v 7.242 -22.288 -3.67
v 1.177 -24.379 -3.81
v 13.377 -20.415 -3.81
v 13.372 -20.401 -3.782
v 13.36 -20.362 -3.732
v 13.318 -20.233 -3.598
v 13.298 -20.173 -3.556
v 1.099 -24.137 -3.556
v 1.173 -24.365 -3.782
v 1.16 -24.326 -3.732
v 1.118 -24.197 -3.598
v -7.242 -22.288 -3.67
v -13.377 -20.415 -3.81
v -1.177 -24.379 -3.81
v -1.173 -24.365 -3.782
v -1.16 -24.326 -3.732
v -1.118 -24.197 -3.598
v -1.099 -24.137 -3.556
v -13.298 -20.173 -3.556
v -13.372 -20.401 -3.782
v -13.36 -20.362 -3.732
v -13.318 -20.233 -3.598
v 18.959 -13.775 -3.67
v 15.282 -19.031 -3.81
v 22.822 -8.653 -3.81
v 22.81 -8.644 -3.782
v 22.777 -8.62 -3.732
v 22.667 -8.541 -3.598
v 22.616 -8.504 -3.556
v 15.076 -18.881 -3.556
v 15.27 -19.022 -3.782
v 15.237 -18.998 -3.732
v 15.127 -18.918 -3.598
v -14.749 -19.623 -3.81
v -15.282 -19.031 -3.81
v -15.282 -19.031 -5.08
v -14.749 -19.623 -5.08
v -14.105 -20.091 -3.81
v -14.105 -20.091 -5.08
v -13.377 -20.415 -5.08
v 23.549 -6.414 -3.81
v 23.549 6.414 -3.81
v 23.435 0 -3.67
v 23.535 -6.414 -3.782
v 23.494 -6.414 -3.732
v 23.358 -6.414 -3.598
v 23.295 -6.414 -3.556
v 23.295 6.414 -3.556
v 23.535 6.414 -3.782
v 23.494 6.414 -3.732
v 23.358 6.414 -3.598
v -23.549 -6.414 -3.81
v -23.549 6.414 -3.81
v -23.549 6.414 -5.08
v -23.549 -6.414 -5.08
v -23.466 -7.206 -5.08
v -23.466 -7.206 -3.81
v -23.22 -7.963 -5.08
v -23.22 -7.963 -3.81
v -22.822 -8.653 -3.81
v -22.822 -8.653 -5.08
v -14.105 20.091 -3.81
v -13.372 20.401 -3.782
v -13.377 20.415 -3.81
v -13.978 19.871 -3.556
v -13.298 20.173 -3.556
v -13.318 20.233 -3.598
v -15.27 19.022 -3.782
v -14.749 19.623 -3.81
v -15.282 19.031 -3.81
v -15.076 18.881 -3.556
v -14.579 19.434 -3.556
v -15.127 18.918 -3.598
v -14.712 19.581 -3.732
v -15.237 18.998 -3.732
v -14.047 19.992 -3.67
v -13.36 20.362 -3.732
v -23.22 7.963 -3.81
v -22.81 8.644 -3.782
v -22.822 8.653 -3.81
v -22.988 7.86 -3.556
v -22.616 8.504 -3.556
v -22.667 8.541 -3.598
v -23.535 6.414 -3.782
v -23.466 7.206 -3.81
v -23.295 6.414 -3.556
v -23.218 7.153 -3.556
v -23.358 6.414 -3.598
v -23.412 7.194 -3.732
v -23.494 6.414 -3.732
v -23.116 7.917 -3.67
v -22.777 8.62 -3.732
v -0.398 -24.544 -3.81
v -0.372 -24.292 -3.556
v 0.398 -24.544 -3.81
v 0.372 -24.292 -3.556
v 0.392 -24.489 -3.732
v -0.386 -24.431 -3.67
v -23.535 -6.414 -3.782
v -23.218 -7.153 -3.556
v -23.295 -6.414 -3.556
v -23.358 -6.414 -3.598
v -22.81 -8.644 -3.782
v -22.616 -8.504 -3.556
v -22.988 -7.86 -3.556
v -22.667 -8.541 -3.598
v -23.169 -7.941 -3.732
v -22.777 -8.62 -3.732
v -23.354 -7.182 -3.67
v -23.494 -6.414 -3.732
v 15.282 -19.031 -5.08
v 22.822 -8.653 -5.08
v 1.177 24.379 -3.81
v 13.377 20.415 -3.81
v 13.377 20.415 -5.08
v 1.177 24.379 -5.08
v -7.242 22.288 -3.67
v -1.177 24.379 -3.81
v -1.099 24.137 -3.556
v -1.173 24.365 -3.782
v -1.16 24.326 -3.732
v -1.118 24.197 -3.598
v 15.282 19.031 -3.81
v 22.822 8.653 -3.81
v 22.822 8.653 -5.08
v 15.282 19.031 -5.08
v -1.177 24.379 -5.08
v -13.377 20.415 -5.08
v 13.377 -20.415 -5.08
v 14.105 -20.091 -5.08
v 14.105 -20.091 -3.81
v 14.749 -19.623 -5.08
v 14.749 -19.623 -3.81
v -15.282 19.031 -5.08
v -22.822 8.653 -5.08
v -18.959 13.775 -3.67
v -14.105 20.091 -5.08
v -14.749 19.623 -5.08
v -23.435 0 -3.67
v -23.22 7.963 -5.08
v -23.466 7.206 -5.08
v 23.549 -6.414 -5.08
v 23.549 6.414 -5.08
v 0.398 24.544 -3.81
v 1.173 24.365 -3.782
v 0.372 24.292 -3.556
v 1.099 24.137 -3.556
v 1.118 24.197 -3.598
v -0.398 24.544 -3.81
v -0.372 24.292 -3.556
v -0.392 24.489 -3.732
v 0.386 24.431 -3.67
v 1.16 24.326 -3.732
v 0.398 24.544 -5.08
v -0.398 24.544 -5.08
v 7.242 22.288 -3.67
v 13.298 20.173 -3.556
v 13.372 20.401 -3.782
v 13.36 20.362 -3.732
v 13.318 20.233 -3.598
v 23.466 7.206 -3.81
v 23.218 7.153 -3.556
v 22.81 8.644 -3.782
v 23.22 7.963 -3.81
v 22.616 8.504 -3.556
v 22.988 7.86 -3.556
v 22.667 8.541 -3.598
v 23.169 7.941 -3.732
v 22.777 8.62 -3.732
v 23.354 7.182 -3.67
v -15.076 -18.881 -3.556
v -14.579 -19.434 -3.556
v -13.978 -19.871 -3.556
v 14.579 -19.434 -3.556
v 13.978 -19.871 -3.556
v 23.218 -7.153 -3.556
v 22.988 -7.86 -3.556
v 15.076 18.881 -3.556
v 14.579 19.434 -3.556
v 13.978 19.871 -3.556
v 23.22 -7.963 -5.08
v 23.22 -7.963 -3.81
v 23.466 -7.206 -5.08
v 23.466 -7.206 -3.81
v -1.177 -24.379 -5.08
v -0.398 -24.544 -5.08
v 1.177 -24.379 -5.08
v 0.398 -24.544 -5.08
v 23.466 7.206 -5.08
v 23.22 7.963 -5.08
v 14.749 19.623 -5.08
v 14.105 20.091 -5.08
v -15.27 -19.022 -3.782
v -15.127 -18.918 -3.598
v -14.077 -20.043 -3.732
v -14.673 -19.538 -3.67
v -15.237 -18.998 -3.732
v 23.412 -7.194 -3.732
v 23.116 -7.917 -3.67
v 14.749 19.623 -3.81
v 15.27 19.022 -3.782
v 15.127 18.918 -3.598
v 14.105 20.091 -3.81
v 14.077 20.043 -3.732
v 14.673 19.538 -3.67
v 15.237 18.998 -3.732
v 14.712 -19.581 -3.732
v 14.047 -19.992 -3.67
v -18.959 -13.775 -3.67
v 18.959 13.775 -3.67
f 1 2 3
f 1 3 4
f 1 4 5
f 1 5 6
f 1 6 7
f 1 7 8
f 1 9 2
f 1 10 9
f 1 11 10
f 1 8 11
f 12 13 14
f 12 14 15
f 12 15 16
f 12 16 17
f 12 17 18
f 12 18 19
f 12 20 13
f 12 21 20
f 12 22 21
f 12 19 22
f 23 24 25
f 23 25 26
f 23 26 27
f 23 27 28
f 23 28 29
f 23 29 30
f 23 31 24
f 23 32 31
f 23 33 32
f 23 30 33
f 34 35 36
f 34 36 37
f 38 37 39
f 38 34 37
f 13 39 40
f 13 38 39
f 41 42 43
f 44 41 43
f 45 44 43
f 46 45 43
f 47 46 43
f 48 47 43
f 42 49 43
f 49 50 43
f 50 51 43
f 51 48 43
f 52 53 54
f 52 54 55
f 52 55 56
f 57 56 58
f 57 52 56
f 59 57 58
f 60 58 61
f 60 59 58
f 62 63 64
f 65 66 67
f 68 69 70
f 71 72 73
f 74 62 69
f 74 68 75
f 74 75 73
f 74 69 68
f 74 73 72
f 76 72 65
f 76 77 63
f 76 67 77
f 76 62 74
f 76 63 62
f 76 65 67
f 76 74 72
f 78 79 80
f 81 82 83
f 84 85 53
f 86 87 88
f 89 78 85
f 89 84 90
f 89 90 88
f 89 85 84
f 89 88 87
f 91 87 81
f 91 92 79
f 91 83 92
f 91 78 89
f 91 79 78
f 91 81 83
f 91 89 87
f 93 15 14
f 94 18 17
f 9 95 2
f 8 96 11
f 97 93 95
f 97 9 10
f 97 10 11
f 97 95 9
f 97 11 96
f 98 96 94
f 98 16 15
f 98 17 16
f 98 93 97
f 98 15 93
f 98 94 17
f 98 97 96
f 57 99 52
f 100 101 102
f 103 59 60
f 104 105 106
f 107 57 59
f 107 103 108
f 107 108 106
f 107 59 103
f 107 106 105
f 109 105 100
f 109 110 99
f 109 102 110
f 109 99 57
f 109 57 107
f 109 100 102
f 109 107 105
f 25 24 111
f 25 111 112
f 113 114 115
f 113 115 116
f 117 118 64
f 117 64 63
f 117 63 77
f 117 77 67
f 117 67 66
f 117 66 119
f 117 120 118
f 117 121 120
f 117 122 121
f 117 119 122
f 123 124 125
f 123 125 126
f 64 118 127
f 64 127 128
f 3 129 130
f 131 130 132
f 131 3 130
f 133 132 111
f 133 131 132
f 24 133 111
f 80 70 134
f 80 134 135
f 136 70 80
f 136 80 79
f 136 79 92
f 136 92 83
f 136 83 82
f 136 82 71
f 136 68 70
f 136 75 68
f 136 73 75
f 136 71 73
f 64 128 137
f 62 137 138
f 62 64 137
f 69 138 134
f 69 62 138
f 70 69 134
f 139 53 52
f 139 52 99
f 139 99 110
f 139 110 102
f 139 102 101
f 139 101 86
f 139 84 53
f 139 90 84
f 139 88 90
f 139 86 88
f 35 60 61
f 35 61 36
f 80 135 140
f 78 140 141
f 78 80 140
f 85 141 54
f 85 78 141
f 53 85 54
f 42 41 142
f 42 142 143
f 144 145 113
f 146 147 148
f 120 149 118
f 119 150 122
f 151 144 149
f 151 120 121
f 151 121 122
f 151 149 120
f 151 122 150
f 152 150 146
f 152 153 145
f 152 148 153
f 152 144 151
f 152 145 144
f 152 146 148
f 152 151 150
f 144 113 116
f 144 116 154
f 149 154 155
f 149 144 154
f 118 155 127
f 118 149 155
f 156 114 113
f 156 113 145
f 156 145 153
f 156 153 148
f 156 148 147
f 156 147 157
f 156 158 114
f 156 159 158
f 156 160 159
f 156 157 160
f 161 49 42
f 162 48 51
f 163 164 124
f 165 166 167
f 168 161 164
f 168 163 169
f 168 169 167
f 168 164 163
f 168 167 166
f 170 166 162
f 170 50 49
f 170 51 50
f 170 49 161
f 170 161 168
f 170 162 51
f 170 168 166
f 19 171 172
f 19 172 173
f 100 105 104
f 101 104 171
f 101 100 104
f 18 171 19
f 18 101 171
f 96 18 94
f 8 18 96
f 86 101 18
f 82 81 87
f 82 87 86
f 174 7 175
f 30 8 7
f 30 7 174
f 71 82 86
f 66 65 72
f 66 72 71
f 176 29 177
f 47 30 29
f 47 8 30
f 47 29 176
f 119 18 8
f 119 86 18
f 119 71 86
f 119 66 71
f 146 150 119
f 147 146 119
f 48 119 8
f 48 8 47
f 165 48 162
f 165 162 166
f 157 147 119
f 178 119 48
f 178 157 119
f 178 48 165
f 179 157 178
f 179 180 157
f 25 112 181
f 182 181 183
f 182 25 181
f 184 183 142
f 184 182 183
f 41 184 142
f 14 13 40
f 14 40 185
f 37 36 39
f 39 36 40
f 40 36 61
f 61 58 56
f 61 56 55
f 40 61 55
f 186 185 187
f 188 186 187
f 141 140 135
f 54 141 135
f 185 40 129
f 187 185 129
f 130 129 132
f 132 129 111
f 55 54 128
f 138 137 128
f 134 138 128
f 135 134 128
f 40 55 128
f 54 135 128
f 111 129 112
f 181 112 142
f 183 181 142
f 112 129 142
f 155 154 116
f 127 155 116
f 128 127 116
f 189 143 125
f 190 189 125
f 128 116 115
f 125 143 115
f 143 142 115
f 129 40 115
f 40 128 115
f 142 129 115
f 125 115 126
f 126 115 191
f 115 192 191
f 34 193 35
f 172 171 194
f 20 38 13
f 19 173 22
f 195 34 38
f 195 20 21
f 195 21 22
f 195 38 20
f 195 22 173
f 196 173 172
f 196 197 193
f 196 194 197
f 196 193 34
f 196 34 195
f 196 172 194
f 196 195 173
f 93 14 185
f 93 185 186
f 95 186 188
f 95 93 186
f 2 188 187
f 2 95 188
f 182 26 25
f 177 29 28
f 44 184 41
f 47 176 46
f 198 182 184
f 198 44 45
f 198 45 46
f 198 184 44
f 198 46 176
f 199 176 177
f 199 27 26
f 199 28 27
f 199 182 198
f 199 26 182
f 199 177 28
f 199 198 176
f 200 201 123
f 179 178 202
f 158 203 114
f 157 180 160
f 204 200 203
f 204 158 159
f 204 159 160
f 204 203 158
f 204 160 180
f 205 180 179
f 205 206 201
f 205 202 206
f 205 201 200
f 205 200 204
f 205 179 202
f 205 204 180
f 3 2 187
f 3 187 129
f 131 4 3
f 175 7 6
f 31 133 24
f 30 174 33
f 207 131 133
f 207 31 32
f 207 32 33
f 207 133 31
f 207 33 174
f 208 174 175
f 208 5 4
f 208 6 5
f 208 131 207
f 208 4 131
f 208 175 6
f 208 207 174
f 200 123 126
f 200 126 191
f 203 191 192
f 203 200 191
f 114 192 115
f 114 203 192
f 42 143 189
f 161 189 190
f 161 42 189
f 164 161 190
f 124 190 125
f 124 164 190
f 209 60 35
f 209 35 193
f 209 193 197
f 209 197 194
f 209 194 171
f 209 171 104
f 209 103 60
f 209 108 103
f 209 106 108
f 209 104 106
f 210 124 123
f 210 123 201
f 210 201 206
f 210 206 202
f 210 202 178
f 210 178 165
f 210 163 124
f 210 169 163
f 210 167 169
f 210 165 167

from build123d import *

# Parameters (mm, degrees)
F1_DEPTH       = 5.08
F2_R           = 6.35
F3_R           = 1.27
F5_DEPTH       = 1.27
F7_D           = 3.81
F7_DEPTH       = 12.7
F7_CBORE_D     = 5.08
F7_CBORE_DEPTH = 1.27
F7_TIP         = 1.1446394792
F8_DEPTH       = 25.4
F9_DEPTH       = 6.35
F10_DEPTH      = 1.016
F11_T1_DEPTH   = 12.8274282372
F11_T3_DEPTH   = 12.8274282372
F11_T5_DEPTH   = 12.8274282372
F11_T7_DEPTH   = 12.8274282372
F11_T9_DEPTH   = 12.8274282372
F11_T11_DEPTH  = 12.8274282372
F11_T13_DEPTH  = 12.8274282372
F11_T15_DEPTH  = 12.8274282372
F11_T17_DEPTH  = 12.8274282372
F11_T20_ANGLE  = 36
F11_T22_ANGLE  = 36
F11_T24_ANGLE  = 36
F11_T26_ANGLE  = 36
F11_T28_ANGLE  = 36
F11_T30_ANGLE  = 36
F11_T32_ANGLE  = 36
F11_T34_ANGLE  = 36
F11_T36_ANGLE  = 36
F11_T38_ANGLE  = 36


# Not quite as in the source:
# - a fillet or chamfer that OpenCascade refuses, or shapes differently, is made with other operations: its cross-section is extruded or revolved along the edge and cut away or added


with BuildPart() as f1:
    # F0 (on Top) → F1 (new body, symmetric)
    with BuildSketch(Plane.XY):
        Polygon((26.089382355, -8.4769541897), (26.089382355, 8.4769541897), (16.1241250409, 22.1929541897), (0, 27.432), (-16.1241250409, 22.1929541897), (-26.089382355, 8.4769541897), (-26.089382355, -8.4769541897), (-16.1241250409, -22.1929541897), (0, -27.432), (16.1241250409, -22.1929541897), align=None)
    extrude(amount=F1_DEPTH, both=True)

    # F2
    f2_edges = [f1.edges().sort_by_distance(p)[0] for p in [
        (-16.124125, -22.192954, 0),
        (-26.089382, -8.476954, 0),
        (-26.089382, 8.476954, 0),
        (-16.124125, 22.192954, 0),
        (0, 27.432, 0),
        (16.124125, 22.192954, 0),
        (26.089382, 8.476954, 0),
        (16.124125, -22.192954, 0),
        (0, -27.432, 0),
        (26.089382, -8.476954, 0),
    ]]
    fillet(f2_edges, radius=F2_R)

    # F3
    f3_edges = [f1.edges().sort_by_distance(p)[0] for p in [
        (21.106754, -15.334954, -5.08),
        (15.932046, -21.928579, -5.08),
        (25.778591, -8.375972, -5.08),
        (8.062063, -24.812477, -5.08),
        (26.089382, 0, -5.08),
        (0, -27.105215, -5.08),
        (25.778591, 8.375972, -5.08),
        (-8.062063, -24.812477, -5.08),
        (21.106754, 15.334954, -5.08),
        (-15.932046, -21.928579, -5.08),
        (15.932046, 21.928579, -5.08),
        (-21.106754, -15.334954, -5.08),
        (8.062063, 24.812477, -5.08),
        (-25.778591, -8.375972, -5.08),
        (0, 27.105215, -5.08),
        (-26.089382, 0, -5.08),
        (-8.062063, 24.812477, -5.08),
        (-25.778591, 8.375972, -5.08),
        (-15.932046, 21.928579, -5.08),
        (-21.106754, 15.334954, -5.08),
    ]]
    fillet(f3_edges, radius=F3_R)

    # F4 (on face) → F5 (cut)
    with BuildSketch(Plane.XY.offset(5.08)):
        with BuildLine():
            ThreePointArc((-23.549382355, -6.4137141186), (-23.3629076821, -7.5910688672), (-22.8217371036, -8.6531759298))
            Line((-22.8217371036, -8.6531759298), (-15.2819639609, -19.0307833679))
            ThreePointArc((-15.2819639609, -19.0307833679), (-14.4390710236, -19.8736763052), (-13.3769639609, -20.4148468837))
            Line((-13.3769639609, -20.4148468837), (-1.1773547486, -24.3787402032))
            ThreePointArc((-1.1773547486, -24.3787402032), (0, -24.5652148761), (1.1773547486, -24.3787402032))
            Line((1.1773547486, -24.3787402032), (13.3769639609, -20.4148468837))
            ThreePointArc((13.3769639609, -20.4148468837), (14.4390710236, -19.8736763052), (15.2819639609, -19.0307833679))
            Line((15.2819639609, -19.0307833679), (22.8217371036, -8.6531759298))
            ThreePointArc((22.8217371036, -8.6531759298), (23.3629076821, -7.5910688672), (23.549382355, -6.4137141186))
            Line((23.549382355, -6.4137141186), (23.549382355, 6.4137141186))
            ThreePointArc((23.549382355, 6.4137141186), (23.3629076821, 7.5910688672), (22.8217371036, 8.6531759298))
            Line((22.8217371036, 8.6531759298), (15.2819639609, 19.0307833679))
            ThreePointArc((15.2819639609, 19.0307833679), (14.4390710236, 19.8736763052), (13.3769639609, 20.4148468837))
            Line((13.3769639609, 20.4148468837), (1.1773547486, 24.3787402032))
            ThreePointArc((1.1773547486, 24.3787402032), (0, 24.5652148761), (-1.1773547486, 24.3787402032))
            Line((-1.1773547486, 24.3787402032), (-13.3769639609, 20.4148468837))
            ThreePointArc((-13.3769639609, 20.4148468837), (-14.4390710236, 19.8736763052), (-15.2819639609, 19.0307833679))
            Line((-15.2819639609, 19.0307833679), (-22.8217371036, 8.6531759298))
            ThreePointArc((-22.8217371036, 8.6531759298), (-23.3629076821, 7.5910688672), (-23.549382355, 6.4137141186))
            Line((-23.549382355, 6.4137141186), (-23.549382355, -6.4137141186))
        make_face()
    extrude(amount=-F5_DEPTH, mode=Mode.SUBTRACT)

    # F7
    with Locations(Plane.YZ.offset(26.089382355)):
        with Locations((0, 0)):
            CounterBoreHole(F7_D / 2, F7_CBORE_D / 2, F7_CBORE_DEPTH, depth=F7_DEPTH)
            with Locations((0, 0, -(F7_DEPTH + F7_TIP / 2))):  # 118° drill point
                Cone(0, F7_D / 2, F7_TIP, mode=Mode.SUBTRACT)

    # F8 (cut): a face of the model
    f8_faces = [f1.faces().sort_by_distance(p)[0] for p in [
        (20.4980312163, -14.892691419, 5.08),
    ]]
    extrude(f8_faces, amount=-F8_DEPTH, mode=Mode.SUBTRACT)

    # F9 (cut): a face of the model
    f9_faces = [f1.faces().sort_by_distance(p)[0] for p in [
        (0, 0, 3.81),
    ]]
    extrude(f9_faces, amount=-F9_DEPTH, mode=Mode.SUBTRACT)

    # F10 (cut): a face of the model
    f10_faces = [f1.faces().sort_by_distance(p)[0] for p in [
        (0, 0, -2.54),
    ]]
    extrude(f10_faces, amount=-F10_DEPTH, mode=Mode.SUBTRACT)

    # F11: fillet of radius 0.254 on 20 edges, made by hand

    # F11_s2 → F11_t1 (cut)
    with BuildSketch(Plane(origin=(3.7698865713, 5.188803719, 0), x_dir=(0, 0, 1), z_dir=(-0.5877852523, -0.8090169944, 0))):
        with BuildLine():
            add(Edge.make_bspline(
                [(-3.81, 23.549382355), (-3.556, 23.549382355), (-3.556, 23.295382355)],
                knots=[0, 0, 0, 1, 1, 1], degree=2, weights=[1, 0.1111111111, 1]))
            Line((-3.556, 23.295382355), (-3.556, 23.549382355))
            Line((-3.556, 23.549382355), (-3.81, 23.549382355))
        make_face()
    extrude(amount=F11_T1_DEPTH, mode=Mode.SUBTRACT)

    # F11_s4 → F11_t3 (cut)
    with BuildSketch(Plane.XZ.offset(-6.4137141186)):
        with BuildLine():
            add(Edge.make_bspline(
                [(-23.549382355, -3.81), (-23.549382355, -3.556), (-23.295382355, -3.556)],
                knots=[0, 0, 0, 1, 1, 1], degree=2, weights=[1, 0.1111111111, 1]))
            Line((-23.295382355, -3.556), (-23.549382355, -3.556))
            Line((-23.549382355, -3.556), (-23.549382355, -3.81))
        make_face()
        with BuildLine():
            add(Edge.make_bspline(
                [(23.549382355, -3.81), (23.549382355, -3.556), (23.295382355, -3.556)],
                knots=[0, 0, 0, 1, 1, 1], degree=2, weights=[1, 0.1111111111, 1]))
            Line((23.295382355, -3.556), (23.549382355, -3.556))
            Line((23.549382355, -3.556), (23.549382355, -3.81))
        make_face()
    extrude(amount=F11_T3_DEPTH, mode=Mode.SUBTRACT)

    # F11_s6 → F11_t5 (cut)
    with BuildSketch(Plane(origin=(-3.7698865713, 5.188803719, 0), x_dir=(0, 0, 1), z_dir=(0.5877852523, -0.8090169944, 0))):
        with BuildLine():
            add(Edge.make_bspline(
                [(-3.81, 23.549382355), (-3.556, 23.549382355), (-3.556, 23.295382355)],
                knots=[0, 0, 0, 1, 1, 1], degree=2, weights=[1, 0.1111111111, 1]))
            Line((-3.556, 23.295382355), (-3.556, 23.549382355))
            Line((-3.556, 23.549382355), (-3.81, 23.549382355))
        make_face()
    extrude(amount=F11_T5_DEPTH, mode=Mode.SUBTRACT)

    # F11_s8 → F11_t7 (cut)
    with BuildSketch(Plane(origin=(-6.0998046062, 1.9819466597, 0), x_dir=(0, 0, 1), z_dir=(0.9510565163, -0.3090169944, 0))):
        with BuildLine():
            add(Edge.make_bspline(
                [(-3.81, 23.549382355), (-3.556, 23.549382355), (-3.556, 23.295382355)],
                knots=[0, 0, 0, 1, 1, 1], degree=2, weights=[1, 0.1111111111, 1]))
            Line((-3.556, 23.295382355), (-3.556, 23.549382355))
            Line((-3.556, 23.549382355), (-3.81, 23.549382355))
        make_face()
    extrude(amount=F11_T7_DEPTH, mode=Mode.SUBTRACT)

    # F11_s10 → F11_t9 (cut)
    with BuildSketch(Plane(origin=(-6.0998046062, -1.9819466597, 0), x_dir=(0, 0, 1), z_dir=(0.9510565163, 0.3090169944, 0))):
        with BuildLine():
            add(Edge.make_bspline(
                [(-3.81, 23.549382355), (-3.556, 23.549382355), (-3.556, 23.295382355)],
                knots=[0, 0, 0, 1, 1, 1], degree=2, weights=[1, 0.1111111111, 1]))
            Line((-3.556, 23.295382355), (-3.556, 23.549382355))
            Line((-3.556, 23.549382355), (-3.81, 23.549382355))
        make_face()
    extrude(amount=F11_T9_DEPTH, mode=Mode.SUBTRACT)

    # F11_s12 → F11_t11 (cut)
    with BuildSketch(Plane(origin=(-3.7698865713, -5.188803719, 0), x_dir=(0, 0, 1), z_dir=(0.5877852523, 0.8090169944, 0))):
        with BuildLine():
            add(Edge.make_bspline(
                [(-3.81, 23.549382355), (-3.556, 23.549382355), (-3.556, 23.295382355)],
                knots=[0, 0, 0, 1, 1, 1], degree=2, weights=[1, 0.1111111111, 1]))
            Line((-3.556, 23.295382355), (-3.556, 23.549382355))
            Line((-3.556, 23.549382355), (-3.81, 23.549382355))
        make_face()
    extrude(amount=F11_T11_DEPTH, mode=Mode.SUBTRACT)

    # F11_s14 → F11_t13 (cut)
    with BuildSketch(Plane(origin=(3.7698865713, -5.188803719, 0), x_dir=(0, 0, 1), z_dir=(-0.5877852523, 0.8090169944, 0))):
        with BuildLine():
            add(Edge.make_bspline(
                [(-3.81, 23.549382355), (-3.556, 23.549382355), (-3.556, 23.295382355)],
                knots=[0, 0, 0, 1, 1, 1], degree=2, weights=[1, 0.1111111111, 1]))
            Line((-3.556, 23.295382355), (-3.556, 23.549382355))
            Line((-3.556, 23.549382355), (-3.81, 23.549382355))
        make_face()
    extrude(amount=F11_T13_DEPTH, mode=Mode.SUBTRACT)

    # F11_s16 → F11_t15 (cut)
    with BuildSketch(Plane(origin=(6.0998046062, -1.9819466597, 0), x_dir=(0, 0, 1), z_dir=(-0.9510565163, 0.3090169944, 0))):
        with BuildLine():
            add(Edge.make_bspline(
                [(-3.81, 23.549382355), (-3.556, 23.549382355), (-3.556, 23.295382355)],
                knots=[0, 0, 0, 1, 1, 1], degree=2, weights=[1, 0.1111111111, 1]))
            Line((-3.556, 23.295382355), (-3.556, 23.549382355))
            Line((-3.556, 23.549382355), (-3.81, 23.549382355))
        make_face()
    extrude(amount=F11_T15_DEPTH, mode=Mode.SUBTRACT)

    # F11_s18 → F11_t17 (cut)
    with BuildSketch(Plane(origin=(6.0998046062, 1.9819466597, 0), x_dir=(0, 0, 1), z_dir=(-0.9510565163, -0.3090169944, 0))):
        with BuildLine():
            add(Edge.make_bspline(
                [(-3.81, 23.549382355), (-3.556, 23.549382355), (-3.556, 23.295382355)],
                knots=[0, 0, 0, 1, 1, 1], degree=2, weights=[1, 0.1111111111, 1]))
            Line((-3.556, 23.295382355), (-3.556, 23.549382355))
            Line((-3.556, 23.549382355), (-3.81, 23.549382355))
        make_face()
    extrude(amount=F11_T17_DEPTH, mode=Mode.SUBTRACT)

    # F11_s19 → F11_t20 (revolve, cut)
    with BuildSketch(Plane(origin=(-6.0998046062, -1.9819466597, 0), x_dir=(0, 0, 1), z_dir=(0.9510565163, 0.3090169944, 0))):
        with BuildLine():
            add(Edge.make_bspline(
                [(-3.81, -23.549382355), (-3.556, -23.549382355), (-3.556, -23.295382355)],
                knots=[0, 0, 0, 1, 1, 1], degree=2, weights=[1, 0.1111111111, 1]))
            Line((-3.556, -23.295382355), (-3.556, -23.549382355))
            Line((-3.556, -23.549382355), (-3.81, -23.549382355))
        make_face()
    revolve(axis=Axis((-12.1996092123, 16.7913215567, -3.556), (0, 0, 1)), revolution_arc=F11_T20_ANGLE, mode=Mode.SUBTRACT)

    # F11_s21 → F11_t22 (revolve, cut)
    with BuildSketch(Plane(origin=(-3.7698865713, -5.188803719, 0), x_dir=(0, 0, 1), z_dir=(0.5877852523, 0.8090169944, 0))):
        with BuildLine():
            add(Edge.make_bspline(
                [(-3.81, -23.549382355), (-3.556, -23.549382355), (-3.556, -23.295382355)],
                knots=[0, 0, 0, 1, 1, 1], degree=2, weights=[1, 0.1111111111, 1]))
            Line((-3.556, -23.295382355), (-3.556, -23.549382355))
            Line((-3.556, -23.549382355), (-3.81, -23.549382355))
        make_face()
    revolve(axis=Axis((-19.739382355, 6.4137141186, -3.556), (0, 0, 1)), revolution_arc=F11_T22_ANGLE, mode=Mode.SUBTRACT)

    # F11_s23 → F11_t24 (revolve, cut)
    with BuildSketch(Plane.XZ.offset(6.4137141186)):
        with BuildLine():
            add(Edge.make_bspline(
                [(-23.549382355, -3.81), (-23.549382355, -3.556), (-23.295382355, -3.556)],
                knots=[0, 0, 0, 1, 1, 1], degree=2, weights=[1, 0.1111111111, 1]))
            Line((-23.295382355, -3.556), (-23.549382355, -3.556))
            Line((-23.549382355, -3.556), (-23.549382355, -3.81))
        make_face()
    revolve(axis=Axis((-19.739382355, -6.4137141186, -3.556), (0, 0, 1)), revolution_arc=F11_T24_ANGLE, mode=Mode.SUBTRACT)

    # F11_s25 → F11_t26 (revolve, cut)
    with BuildSketch(Plane(origin=(3.7698865713, -5.188803719, 0), x_dir=(0, 0, 1), z_dir=(-0.5877852523, 0.8090169944, 0))):
        with BuildLine():
            add(Edge.make_bspline(
                [(-3.81, -23.549382355), (-3.556, -23.549382355), (-3.556, -23.295382355)],
                knots=[0, 0, 0, 1, 1, 1], degree=2, weights=[1, 0.1111111111, 1]))
            Line((-3.556, -23.295382355), (-3.556, -23.549382355))
            Line((-3.556, -23.549382355), (-3.81, -23.549382355))
        make_face()
    revolve(axis=Axis((-12.1996092123, -16.7913215567, -3.556), (0, 0, 1)), revolution_arc=F11_T26_ANGLE, mode=Mode.SUBTRACT)

    # F11_s27 → F11_t28 (revolve, cut)
    with BuildSketch(Plane(origin=(6.0998046062, -1.9819466597, 0), x_dir=(0, 0, 1), z_dir=(-0.9510565163, 0.3090169944, 0))):
        with BuildLine():
            add(Edge.make_bspline(
                [(-3.81, -23.549382355), (-3.556, -23.549382355), (-3.556, -23.295382355)],
                knots=[0, 0, 0, 1, 1, 1], degree=2, weights=[1, 0.1111111111, 1]))
            Line((-3.556, -23.295382355), (-3.556, -23.549382355))
            Line((-3.556, -23.549382355), (-3.81, -23.549382355))
        make_face()
    revolve(axis=Axis((0, -20.7552148761, -3.556), (0, 0, 1)), revolution_arc=F11_T28_ANGLE, mode=Mode.SUBTRACT)

    # F11_s29 → F11_t30 (revolve, cut)
    with BuildSketch(Plane(origin=(6.0998046062, 1.9819466597, 0), x_dir=(0, 0, 1), z_dir=(-0.9510565163, -0.3090169944, 0))):
        with BuildLine():
            add(Edge.make_bspline(
                [(-3.81, -23.549382355), (-3.556, -23.549382355), (-3.556, -23.295382355)],
                knots=[0, 0, 0, 1, 1, 1], degree=2, weights=[1, 0.1111111111, 1]))
            Line((-3.556, -23.295382355), (-3.556, -23.549382355))
            Line((-3.556, -23.549382355), (-3.81, -23.549382355))
        make_face()
    revolve(axis=Axis((12.1996092123, -16.7913215567, -3.556), (0, 0, 1)), revolution_arc=F11_T30_ANGLE, mode=Mode.SUBTRACT)

    # F11_s31 → F11_t32 (revolve, cut)
    with BuildSketch(Plane(origin=(3.7698865713, 5.188803719, 0), x_dir=(0, 0, 1), z_dir=(-0.5877852523, -0.8090169944, 0))):
        with BuildLine():
            add(Edge.make_bspline(
                [(-3.81, -23.549382355), (-3.556, -23.549382355), (-3.556, -23.295382355)],
                knots=[0, 0, 0, 1, 1, 1], degree=2, weights=[1, 0.1111111111, 1]))
            Line((-3.556, -23.295382355), (-3.556, -23.549382355))
            Line((-3.556, -23.549382355), (-3.81, -23.549382355))
        make_face()
    revolve(axis=Axis((19.739382355, -6.4137141186, -3.556), (0, 0, 1)), revolution_arc=F11_T32_ANGLE, mode=Mode.SUBTRACT)

    # F11_s33 → F11_t34 (revolve, cut)
    with BuildSketch(Plane.XZ.offset(-6.4137141186)):
        with BuildLine():
            add(Edge.make_bspline(
                [(23.549382355, -3.81), (23.549382355, -3.556), (23.295382355, -3.556)],
                knots=[0, 0, 0, 1, 1, 1], degree=2, weights=[1, 0.1111111111, 1]))
            Line((23.295382355, -3.556), (23.549382355, -3.556))
            Line((23.549382355, -3.556), (23.549382355, -3.81))
        make_face()
    revolve(axis=Axis((19.739382355, 6.4137141186, -3.556), (0, 0, 1)), revolution_arc=F11_T34_ANGLE, mode=Mode.SUBTRACT)

    # F11_s35 → F11_t36 (revolve, cut)
    with BuildSketch(Plane(origin=(-3.7698865713, 5.188803719, 0), x_dir=(0, 0, 1), z_dir=(0.5877852523, -0.8090169944, 0))):
        with BuildLine():
            add(Edge.make_bspline(
                [(-3.81, -23.549382355), (-3.556, -23.549382355), (-3.556, -23.295382355)],
                knots=[0, 0, 0, 1, 1, 1], degree=2, weights=[1, 0.1111111111, 1]))
            Line((-3.556, -23.295382355), (-3.556, -23.549382355))
            Line((-3.556, -23.549382355), (-3.81, -23.549382355))
        make_face()
    revolve(axis=Axis((12.1996092123, 16.7913215567, -3.556), (0, 0, 1)), revolution_arc=F11_T36_ANGLE, mode=Mode.SUBTRACT)

    # F11_s37 → F11_t38 (revolve, cut)
    with BuildSketch(Plane(origin=(-6.0998046062, 1.9819466597, 0), x_dir=(0, 0, 1), z_dir=(0.9510565163, -0.3090169944, 0))):
        with BuildLine():
            add(Edge.make_bspline(
                [(-3.81, -23.549382355), (-3.556, -23.549382355), (-3.556, -23.295382355)],
                knots=[0, 0, 0, 1, 1, 1], degree=2, weights=[1, 0.1111111111, 1]))
            Line((-3.556, -23.295382355), (-3.556, -23.549382355))
            Line((-3.556, -23.549382355), (-3.81, -23.549382355))
        make_face()
    revolve(axis=Axis((0, 20.7552148761, -3.556), (0, 0, 1)), revolution_arc=F11_T38_ANGLE, mode=Mode.SUBTRACT)


solid = f1.part
